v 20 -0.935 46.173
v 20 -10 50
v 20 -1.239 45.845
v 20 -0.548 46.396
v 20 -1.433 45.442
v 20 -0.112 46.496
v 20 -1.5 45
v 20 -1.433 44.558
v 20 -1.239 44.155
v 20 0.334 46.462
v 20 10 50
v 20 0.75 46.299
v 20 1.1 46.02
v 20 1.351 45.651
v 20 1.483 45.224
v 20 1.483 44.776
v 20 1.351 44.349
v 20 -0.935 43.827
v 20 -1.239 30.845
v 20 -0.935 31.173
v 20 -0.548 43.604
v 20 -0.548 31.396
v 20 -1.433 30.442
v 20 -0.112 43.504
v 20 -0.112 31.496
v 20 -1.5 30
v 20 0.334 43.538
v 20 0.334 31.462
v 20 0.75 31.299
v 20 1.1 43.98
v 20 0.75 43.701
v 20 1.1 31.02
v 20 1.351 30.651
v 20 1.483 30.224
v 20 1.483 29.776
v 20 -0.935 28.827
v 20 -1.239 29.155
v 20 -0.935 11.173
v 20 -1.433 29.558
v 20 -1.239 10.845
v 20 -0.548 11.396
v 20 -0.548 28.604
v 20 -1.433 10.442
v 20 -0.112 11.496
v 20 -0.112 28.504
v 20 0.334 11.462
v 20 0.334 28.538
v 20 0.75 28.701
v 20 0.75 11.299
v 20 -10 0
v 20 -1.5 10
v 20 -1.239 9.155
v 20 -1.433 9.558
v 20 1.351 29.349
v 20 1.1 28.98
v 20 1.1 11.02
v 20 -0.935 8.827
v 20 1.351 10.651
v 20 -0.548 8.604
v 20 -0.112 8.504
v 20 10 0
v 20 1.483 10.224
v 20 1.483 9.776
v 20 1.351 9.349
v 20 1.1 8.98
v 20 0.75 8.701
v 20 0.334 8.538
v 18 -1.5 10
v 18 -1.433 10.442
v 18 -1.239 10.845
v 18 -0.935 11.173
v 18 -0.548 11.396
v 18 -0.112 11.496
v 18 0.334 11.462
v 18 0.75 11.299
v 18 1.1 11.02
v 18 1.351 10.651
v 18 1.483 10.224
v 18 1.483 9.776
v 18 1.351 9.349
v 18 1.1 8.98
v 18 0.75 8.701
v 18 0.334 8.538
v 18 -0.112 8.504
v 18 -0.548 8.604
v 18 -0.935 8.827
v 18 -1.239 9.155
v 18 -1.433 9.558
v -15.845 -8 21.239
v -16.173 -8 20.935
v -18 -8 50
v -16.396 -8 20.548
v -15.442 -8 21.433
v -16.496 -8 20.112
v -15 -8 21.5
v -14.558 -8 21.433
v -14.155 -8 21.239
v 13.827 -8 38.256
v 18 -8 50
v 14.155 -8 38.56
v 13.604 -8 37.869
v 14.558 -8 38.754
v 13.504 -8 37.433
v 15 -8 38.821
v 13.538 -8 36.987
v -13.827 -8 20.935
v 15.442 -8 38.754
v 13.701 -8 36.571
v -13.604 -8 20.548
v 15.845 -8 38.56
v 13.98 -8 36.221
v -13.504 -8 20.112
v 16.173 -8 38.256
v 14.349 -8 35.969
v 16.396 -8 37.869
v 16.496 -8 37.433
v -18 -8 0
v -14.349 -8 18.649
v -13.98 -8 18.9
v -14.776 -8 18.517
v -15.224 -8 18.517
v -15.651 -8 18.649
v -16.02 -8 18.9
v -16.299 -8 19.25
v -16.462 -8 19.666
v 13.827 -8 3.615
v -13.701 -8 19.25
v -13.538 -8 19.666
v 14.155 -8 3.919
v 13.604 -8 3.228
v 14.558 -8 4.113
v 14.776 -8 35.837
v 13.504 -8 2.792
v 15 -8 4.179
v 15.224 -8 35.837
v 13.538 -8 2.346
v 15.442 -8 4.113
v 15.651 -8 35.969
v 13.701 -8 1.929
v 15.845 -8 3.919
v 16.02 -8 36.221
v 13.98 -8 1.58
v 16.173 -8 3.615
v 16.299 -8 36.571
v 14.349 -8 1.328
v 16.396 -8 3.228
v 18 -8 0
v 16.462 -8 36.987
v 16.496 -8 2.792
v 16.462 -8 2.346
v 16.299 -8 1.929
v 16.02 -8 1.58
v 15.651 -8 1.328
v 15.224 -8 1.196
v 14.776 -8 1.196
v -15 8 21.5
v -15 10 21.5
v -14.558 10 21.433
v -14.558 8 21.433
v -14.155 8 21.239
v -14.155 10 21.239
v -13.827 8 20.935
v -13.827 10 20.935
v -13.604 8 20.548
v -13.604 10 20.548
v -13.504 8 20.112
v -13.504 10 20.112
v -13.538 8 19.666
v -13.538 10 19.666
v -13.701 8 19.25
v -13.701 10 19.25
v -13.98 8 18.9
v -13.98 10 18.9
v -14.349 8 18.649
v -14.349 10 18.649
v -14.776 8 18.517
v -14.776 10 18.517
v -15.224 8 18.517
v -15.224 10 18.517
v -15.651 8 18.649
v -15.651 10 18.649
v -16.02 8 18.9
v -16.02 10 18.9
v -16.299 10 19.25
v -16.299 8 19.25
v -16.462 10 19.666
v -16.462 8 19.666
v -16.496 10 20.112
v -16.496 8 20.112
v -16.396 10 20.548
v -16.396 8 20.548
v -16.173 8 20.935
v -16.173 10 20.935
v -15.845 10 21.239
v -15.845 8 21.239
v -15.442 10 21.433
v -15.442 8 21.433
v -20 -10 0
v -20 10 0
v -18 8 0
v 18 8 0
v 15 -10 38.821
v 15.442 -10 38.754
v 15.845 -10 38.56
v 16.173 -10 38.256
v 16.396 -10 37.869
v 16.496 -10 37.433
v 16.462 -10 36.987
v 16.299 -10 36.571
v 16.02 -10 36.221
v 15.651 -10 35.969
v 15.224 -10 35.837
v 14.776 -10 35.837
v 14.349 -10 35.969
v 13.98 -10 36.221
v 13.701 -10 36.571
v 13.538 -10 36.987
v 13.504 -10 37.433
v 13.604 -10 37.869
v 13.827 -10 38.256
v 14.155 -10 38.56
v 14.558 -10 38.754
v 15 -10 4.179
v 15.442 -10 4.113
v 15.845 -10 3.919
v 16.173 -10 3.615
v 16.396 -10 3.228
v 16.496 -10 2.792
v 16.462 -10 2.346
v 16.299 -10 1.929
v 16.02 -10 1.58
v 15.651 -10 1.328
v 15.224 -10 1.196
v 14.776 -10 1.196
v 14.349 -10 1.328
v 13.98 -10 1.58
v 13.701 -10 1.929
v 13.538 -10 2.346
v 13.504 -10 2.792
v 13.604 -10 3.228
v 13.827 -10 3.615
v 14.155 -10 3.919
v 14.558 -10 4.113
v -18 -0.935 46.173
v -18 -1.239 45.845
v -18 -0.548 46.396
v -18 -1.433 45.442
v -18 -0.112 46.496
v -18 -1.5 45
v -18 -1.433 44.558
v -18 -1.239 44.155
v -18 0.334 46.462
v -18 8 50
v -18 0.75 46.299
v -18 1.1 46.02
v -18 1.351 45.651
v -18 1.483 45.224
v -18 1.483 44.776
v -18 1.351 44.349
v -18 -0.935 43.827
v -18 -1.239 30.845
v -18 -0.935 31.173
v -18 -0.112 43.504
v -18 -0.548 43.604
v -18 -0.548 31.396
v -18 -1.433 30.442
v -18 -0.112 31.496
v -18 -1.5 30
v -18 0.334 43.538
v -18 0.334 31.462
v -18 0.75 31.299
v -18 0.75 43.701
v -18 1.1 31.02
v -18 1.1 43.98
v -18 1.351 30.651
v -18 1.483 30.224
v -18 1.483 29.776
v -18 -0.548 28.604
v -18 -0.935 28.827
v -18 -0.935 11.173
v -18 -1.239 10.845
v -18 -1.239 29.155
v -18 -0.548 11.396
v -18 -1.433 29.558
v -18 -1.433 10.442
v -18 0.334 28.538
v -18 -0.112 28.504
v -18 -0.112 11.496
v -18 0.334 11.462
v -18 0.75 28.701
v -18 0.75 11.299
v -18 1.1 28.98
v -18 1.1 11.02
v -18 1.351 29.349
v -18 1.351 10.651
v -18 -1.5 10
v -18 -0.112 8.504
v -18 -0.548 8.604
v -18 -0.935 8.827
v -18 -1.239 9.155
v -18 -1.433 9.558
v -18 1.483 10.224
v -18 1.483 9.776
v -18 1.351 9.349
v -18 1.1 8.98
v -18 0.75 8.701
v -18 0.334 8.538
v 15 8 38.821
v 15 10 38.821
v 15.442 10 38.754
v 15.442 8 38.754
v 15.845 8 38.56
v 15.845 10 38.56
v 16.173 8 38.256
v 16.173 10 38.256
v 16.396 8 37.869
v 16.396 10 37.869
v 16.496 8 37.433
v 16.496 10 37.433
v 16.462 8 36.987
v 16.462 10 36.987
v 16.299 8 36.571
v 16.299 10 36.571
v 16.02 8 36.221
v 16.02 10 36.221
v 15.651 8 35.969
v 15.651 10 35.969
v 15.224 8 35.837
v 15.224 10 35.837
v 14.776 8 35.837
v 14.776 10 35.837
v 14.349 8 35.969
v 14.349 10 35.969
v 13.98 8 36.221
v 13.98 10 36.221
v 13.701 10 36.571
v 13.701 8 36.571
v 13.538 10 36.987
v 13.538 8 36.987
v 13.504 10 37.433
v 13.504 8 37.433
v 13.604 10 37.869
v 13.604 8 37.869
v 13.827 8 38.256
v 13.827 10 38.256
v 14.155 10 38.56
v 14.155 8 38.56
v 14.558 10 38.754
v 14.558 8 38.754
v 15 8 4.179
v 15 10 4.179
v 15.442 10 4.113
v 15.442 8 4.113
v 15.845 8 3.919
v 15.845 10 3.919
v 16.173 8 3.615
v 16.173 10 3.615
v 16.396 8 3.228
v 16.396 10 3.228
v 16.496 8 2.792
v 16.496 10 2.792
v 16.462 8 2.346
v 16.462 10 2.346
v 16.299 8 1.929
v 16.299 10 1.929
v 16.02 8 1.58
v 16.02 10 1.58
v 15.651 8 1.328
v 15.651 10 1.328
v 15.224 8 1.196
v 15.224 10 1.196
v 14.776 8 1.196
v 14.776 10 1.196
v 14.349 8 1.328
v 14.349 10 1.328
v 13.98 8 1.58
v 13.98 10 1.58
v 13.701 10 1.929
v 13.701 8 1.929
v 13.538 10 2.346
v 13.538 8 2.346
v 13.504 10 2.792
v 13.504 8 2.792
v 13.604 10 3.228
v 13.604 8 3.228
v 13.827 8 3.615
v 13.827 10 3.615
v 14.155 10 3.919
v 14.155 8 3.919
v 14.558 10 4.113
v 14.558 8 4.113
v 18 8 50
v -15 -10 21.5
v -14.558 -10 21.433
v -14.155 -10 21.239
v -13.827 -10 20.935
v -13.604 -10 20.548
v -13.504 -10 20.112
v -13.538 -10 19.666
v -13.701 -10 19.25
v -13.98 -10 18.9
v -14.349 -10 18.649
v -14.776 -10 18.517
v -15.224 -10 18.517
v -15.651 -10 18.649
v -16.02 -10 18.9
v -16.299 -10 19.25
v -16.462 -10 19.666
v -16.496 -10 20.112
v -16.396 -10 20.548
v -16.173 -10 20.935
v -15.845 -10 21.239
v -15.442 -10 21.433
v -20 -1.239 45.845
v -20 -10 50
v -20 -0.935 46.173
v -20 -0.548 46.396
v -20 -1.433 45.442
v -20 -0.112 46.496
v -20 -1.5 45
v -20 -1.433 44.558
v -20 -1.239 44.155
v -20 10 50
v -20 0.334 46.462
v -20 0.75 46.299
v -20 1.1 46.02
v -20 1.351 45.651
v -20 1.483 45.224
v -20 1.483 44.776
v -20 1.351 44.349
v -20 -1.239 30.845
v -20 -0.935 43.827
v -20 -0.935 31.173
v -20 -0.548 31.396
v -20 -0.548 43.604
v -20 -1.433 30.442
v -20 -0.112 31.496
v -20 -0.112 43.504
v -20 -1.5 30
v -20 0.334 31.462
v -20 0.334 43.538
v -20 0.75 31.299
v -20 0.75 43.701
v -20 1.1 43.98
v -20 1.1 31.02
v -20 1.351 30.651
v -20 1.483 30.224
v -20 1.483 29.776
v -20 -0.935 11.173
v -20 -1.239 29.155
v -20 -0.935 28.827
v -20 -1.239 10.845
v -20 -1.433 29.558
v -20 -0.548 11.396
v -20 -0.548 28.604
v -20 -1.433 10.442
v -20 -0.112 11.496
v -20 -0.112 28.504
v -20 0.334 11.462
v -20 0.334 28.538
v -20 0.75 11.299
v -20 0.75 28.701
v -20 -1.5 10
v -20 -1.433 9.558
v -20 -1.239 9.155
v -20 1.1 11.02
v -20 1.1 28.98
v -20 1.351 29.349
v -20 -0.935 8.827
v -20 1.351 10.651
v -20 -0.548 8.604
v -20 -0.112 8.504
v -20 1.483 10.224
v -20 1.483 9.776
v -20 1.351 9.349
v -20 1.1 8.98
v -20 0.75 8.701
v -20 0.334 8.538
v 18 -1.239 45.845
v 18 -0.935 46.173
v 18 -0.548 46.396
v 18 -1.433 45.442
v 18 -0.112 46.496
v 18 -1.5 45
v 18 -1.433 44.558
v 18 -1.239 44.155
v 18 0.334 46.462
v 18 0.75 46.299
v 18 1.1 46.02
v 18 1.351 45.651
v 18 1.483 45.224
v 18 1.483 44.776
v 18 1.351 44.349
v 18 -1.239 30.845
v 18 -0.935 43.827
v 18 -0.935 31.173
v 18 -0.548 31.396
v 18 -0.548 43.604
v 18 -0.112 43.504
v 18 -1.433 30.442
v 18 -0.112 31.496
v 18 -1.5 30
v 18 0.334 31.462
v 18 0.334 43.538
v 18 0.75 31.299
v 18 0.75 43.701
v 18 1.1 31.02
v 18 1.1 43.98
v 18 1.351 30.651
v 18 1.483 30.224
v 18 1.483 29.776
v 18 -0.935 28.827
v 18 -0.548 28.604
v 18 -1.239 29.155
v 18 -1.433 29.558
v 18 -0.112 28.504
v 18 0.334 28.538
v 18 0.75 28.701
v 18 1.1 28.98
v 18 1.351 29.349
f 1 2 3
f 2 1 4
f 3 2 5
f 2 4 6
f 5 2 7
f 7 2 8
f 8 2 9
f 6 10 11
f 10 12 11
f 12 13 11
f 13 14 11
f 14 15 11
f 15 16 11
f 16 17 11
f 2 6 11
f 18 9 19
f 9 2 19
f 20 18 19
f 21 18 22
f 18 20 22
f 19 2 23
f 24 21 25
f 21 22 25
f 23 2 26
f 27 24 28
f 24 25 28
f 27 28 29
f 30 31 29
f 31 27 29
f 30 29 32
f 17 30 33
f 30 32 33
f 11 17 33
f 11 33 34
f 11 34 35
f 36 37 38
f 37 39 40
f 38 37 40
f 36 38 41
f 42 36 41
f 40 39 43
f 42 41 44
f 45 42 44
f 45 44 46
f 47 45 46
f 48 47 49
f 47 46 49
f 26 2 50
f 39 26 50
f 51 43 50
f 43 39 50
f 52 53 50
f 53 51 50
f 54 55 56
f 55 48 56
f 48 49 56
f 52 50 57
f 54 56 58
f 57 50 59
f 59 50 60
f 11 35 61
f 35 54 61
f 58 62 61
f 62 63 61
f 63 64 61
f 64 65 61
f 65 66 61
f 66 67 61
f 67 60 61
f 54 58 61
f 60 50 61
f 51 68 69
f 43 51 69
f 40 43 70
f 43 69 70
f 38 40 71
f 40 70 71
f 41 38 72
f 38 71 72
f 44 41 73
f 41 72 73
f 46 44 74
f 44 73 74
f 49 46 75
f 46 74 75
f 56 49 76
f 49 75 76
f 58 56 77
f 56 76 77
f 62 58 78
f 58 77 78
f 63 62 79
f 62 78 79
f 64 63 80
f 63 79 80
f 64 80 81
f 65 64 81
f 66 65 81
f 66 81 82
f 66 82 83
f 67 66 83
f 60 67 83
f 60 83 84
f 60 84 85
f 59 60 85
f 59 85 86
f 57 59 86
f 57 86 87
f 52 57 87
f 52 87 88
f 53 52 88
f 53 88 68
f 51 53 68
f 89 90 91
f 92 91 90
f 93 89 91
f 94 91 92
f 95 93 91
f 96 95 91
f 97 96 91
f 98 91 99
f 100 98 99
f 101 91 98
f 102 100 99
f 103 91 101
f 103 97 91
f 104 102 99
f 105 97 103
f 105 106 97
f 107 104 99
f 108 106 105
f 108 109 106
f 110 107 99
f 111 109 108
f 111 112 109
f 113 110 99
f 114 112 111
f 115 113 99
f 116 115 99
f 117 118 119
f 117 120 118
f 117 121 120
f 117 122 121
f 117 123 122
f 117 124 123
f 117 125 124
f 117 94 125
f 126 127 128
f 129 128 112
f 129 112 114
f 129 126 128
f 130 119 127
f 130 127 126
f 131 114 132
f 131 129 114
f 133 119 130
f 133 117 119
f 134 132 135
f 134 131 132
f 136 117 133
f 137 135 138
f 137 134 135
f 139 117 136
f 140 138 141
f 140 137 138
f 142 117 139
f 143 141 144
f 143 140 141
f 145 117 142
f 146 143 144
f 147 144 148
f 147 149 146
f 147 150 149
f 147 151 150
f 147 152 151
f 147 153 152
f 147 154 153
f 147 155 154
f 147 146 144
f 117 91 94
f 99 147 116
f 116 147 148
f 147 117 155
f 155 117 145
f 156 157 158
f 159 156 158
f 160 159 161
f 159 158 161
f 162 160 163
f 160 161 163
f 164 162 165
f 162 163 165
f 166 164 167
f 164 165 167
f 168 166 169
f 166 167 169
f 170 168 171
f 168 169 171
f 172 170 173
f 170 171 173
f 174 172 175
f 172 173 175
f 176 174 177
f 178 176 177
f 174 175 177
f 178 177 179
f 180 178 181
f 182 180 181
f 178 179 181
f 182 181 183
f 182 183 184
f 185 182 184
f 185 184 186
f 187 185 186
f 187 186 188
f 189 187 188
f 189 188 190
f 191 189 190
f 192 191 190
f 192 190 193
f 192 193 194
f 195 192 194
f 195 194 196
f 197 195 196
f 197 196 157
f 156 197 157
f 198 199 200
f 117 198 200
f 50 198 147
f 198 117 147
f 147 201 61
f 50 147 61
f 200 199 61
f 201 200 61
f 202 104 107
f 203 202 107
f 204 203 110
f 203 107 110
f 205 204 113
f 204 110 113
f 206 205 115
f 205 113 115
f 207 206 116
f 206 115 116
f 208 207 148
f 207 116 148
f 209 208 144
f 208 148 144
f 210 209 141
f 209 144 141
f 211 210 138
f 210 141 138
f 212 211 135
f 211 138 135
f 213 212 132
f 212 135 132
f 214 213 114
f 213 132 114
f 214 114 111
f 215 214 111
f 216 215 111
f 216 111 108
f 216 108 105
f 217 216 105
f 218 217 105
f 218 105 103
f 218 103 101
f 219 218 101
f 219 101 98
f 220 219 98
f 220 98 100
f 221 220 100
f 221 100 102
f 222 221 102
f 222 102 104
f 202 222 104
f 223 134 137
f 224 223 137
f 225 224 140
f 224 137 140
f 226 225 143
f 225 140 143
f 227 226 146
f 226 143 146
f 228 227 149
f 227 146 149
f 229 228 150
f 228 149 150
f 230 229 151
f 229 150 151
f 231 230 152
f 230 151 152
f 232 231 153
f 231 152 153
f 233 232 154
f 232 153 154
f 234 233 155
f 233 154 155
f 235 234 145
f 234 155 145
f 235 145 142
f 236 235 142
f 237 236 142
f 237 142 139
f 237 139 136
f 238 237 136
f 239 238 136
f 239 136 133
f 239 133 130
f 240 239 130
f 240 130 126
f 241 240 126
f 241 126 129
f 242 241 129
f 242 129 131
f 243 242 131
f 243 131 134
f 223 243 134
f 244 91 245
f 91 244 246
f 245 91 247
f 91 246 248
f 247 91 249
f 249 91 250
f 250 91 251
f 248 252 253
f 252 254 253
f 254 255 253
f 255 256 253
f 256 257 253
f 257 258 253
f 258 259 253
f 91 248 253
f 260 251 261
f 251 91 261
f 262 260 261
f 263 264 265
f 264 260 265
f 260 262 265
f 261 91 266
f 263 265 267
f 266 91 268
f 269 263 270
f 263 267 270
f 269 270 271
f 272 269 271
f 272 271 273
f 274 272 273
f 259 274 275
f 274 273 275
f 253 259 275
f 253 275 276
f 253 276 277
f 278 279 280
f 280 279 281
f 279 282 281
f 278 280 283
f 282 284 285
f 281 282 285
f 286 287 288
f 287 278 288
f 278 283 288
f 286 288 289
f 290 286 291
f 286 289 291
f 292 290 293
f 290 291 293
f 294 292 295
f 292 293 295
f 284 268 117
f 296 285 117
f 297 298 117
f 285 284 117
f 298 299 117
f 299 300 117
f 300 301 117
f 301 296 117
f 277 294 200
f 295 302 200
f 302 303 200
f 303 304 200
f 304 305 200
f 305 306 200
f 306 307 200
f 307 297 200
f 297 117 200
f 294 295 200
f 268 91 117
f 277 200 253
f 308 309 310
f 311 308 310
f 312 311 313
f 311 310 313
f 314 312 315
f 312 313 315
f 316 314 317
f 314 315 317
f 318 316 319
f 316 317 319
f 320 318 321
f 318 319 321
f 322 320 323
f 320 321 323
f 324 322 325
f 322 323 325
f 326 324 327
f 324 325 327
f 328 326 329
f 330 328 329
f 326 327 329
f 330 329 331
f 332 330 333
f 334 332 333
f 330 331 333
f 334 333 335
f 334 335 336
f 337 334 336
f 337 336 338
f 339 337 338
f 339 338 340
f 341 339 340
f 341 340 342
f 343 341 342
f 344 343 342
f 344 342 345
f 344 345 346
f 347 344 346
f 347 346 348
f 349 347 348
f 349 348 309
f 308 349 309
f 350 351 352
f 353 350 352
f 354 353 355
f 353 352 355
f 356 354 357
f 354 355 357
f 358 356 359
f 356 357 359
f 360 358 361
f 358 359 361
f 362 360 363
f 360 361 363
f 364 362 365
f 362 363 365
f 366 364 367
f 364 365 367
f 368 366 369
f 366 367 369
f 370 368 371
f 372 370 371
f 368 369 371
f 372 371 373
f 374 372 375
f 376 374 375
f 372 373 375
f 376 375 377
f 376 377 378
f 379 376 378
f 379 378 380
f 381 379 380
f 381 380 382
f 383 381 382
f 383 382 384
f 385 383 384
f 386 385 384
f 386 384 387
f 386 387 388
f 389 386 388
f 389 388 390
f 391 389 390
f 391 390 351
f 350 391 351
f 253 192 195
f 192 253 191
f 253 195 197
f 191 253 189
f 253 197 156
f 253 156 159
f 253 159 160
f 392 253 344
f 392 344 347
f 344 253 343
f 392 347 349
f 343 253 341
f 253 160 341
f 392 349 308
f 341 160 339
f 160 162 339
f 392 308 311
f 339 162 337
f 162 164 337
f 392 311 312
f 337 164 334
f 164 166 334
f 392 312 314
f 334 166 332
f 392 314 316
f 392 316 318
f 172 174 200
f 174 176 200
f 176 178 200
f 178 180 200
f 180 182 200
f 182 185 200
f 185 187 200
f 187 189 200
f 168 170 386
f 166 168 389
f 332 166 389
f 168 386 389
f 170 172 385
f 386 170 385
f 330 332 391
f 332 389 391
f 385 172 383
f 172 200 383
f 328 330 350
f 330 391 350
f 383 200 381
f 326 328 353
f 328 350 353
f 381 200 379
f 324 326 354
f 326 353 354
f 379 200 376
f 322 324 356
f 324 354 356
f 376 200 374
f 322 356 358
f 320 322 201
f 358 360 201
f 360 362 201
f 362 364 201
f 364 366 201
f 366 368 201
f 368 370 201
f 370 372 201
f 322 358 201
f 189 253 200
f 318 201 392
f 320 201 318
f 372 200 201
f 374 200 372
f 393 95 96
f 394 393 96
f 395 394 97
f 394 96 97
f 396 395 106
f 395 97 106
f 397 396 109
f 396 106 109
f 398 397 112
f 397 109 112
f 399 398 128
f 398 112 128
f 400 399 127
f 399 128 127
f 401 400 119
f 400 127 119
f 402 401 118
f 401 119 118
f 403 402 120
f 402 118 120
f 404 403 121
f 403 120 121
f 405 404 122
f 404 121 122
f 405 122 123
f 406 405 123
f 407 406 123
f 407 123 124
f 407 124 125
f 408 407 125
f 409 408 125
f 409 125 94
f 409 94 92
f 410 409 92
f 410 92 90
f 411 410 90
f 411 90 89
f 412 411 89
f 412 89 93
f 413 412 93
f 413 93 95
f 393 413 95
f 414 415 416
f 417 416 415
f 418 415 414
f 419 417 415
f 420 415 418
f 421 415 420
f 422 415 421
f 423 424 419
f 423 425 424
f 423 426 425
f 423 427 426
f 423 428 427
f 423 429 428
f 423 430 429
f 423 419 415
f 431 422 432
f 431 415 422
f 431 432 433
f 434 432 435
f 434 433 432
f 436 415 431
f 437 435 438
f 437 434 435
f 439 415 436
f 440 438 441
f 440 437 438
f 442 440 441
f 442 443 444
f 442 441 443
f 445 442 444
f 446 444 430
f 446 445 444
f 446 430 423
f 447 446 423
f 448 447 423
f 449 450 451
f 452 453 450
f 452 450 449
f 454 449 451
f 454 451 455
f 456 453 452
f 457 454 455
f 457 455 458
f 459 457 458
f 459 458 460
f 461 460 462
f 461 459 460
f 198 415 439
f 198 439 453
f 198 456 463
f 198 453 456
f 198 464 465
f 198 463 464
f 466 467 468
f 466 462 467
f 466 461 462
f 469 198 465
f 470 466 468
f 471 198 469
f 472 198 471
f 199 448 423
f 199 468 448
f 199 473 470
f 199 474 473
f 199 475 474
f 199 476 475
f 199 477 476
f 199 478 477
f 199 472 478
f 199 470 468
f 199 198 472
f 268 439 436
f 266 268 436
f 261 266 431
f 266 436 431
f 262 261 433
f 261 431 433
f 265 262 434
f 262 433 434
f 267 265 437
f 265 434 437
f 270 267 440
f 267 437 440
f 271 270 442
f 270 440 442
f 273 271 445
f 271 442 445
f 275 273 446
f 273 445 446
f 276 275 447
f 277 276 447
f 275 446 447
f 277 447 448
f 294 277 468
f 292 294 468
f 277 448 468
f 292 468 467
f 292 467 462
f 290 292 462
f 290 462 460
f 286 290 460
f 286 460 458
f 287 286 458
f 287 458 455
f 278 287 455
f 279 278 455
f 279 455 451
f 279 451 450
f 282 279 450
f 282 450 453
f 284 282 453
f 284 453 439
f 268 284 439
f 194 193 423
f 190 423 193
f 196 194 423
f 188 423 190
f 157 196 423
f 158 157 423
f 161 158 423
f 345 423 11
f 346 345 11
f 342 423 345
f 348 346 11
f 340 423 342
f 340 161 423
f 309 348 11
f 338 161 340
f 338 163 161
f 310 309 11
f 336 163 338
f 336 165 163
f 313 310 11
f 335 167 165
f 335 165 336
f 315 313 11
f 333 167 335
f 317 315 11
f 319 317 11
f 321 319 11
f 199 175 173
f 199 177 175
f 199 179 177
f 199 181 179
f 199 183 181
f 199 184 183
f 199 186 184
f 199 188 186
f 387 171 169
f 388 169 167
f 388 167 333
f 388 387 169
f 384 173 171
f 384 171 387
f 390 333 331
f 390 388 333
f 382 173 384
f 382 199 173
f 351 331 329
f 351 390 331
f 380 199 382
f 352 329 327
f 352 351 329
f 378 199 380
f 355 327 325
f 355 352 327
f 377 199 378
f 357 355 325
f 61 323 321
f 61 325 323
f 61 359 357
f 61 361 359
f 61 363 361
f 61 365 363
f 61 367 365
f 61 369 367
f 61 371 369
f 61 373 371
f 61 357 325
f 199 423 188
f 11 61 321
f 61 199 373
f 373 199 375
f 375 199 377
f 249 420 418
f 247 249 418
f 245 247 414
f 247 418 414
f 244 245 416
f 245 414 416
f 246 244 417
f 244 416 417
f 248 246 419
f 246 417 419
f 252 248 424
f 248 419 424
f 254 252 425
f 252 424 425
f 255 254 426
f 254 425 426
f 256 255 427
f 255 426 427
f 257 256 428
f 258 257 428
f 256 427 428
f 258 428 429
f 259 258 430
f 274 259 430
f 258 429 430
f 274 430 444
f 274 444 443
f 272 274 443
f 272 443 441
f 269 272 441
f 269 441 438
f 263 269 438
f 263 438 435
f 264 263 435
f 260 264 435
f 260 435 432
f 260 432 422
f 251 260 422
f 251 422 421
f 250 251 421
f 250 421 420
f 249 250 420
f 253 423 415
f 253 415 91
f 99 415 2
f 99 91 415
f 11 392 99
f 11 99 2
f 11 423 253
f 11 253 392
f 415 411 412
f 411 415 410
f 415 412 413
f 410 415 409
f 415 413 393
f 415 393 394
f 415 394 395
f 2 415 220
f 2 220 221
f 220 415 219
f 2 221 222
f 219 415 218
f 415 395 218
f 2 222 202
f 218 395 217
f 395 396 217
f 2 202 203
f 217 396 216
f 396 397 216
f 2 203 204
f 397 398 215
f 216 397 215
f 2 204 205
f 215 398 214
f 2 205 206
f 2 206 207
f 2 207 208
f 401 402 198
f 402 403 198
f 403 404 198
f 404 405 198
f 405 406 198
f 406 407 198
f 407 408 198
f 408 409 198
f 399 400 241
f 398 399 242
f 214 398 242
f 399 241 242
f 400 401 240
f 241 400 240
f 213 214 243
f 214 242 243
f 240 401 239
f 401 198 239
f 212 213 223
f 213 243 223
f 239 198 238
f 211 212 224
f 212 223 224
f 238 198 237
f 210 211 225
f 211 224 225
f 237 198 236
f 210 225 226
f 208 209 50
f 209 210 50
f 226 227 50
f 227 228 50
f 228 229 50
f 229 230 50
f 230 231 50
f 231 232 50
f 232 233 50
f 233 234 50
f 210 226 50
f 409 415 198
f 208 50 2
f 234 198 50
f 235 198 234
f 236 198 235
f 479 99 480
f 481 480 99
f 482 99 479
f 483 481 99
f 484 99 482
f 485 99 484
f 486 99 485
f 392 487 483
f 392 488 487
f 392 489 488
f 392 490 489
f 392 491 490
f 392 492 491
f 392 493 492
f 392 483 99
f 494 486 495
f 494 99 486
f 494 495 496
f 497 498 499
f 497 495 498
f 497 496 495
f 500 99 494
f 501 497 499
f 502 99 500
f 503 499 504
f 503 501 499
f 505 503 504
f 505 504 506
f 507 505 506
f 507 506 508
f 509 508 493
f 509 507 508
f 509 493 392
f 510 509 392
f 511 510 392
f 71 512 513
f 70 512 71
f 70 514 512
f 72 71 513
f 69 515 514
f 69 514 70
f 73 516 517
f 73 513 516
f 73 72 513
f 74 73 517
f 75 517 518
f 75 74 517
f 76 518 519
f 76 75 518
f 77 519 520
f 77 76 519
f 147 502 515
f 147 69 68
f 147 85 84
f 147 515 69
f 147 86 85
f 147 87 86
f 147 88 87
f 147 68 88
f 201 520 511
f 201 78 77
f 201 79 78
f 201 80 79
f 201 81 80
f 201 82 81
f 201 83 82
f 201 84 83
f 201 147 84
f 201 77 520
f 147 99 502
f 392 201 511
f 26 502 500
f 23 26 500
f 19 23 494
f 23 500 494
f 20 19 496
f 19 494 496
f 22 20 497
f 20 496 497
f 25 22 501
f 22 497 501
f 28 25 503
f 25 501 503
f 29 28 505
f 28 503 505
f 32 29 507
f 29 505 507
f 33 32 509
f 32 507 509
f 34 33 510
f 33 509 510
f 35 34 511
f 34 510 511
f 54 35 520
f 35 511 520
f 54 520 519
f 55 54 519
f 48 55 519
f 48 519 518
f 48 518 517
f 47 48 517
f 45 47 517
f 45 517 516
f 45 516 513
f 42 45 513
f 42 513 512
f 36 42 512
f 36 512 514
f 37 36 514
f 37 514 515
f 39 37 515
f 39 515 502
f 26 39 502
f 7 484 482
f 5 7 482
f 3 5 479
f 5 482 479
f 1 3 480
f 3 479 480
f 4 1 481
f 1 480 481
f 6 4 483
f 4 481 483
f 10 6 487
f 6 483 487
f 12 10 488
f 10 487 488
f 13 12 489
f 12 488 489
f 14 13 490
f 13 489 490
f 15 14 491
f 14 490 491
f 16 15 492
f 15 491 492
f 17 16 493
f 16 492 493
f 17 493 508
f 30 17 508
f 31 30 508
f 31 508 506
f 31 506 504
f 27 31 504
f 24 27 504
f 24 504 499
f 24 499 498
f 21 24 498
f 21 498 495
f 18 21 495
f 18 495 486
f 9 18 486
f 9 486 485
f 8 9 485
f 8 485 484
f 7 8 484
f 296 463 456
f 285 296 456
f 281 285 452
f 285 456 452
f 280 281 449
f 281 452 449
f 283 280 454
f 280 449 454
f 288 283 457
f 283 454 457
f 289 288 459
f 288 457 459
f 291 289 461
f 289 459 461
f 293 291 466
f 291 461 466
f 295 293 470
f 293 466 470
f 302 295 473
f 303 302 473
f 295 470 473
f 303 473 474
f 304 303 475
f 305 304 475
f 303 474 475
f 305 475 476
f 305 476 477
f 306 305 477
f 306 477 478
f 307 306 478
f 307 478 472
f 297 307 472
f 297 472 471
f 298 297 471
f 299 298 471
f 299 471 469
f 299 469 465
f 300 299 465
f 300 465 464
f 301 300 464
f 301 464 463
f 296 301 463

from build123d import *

# Parameters (mm, degrees)
SKETCH_1_W          = 40
SKETCH_1_H          = 20
SKETCH_1_W_2        = 36
SKETCH_1_H_2        = 16
EXTRUDE_1_DEPTH     = 50
SKETCH_2_R          = 1.5
CUT_EXTRUDE_1_DEPTH = 50
SKETCH_3_R          = 1.5
CUT_EXTRUDE_2_DEPTH = 50


with BuildPart() as part:
    # 草图1 → 凸台-拉伸1 (new body)
    with BuildSketch(Plane.XY):
        Rectangle(SKETCH_1_W, SKETCH_1_H)
        Rectangle(SKETCH_1_W_2, SKETCH_1_H_2, mode=Mode.SUBTRACT)
    extrude(amount=EXTRUDE_1_DEPTH)

    # 草图2 → 切除-拉伸1 (cut)
    with BuildSketch(Plane(origin=(0, 10, 0), x_dir=(1, 0, 0), z_dir=(0, 1, 0))):
        with Locations(Location((-15, -20, 0), (0, 0, 270))):
            Circle(SKETCH_2_R)
        with Locations(Location((15, -2.679491924, 0), (0, 0, 270))):
            Circle(SKETCH_2_R)
        with Locations(Location((15, -37.320508076, 0), (0, 0, 270))):
            Circle(SKETCH_2_R)
    extrude(amount=-CUT_EXTRUDE_1_DEPTH, mode=Mode.SUBTRACT)

    # 草图3 → 切除-拉伸2 (cut)
    with BuildSketch(Plane.ZY.offset(20)):
        with Locations(Location((10, 0, 0), (0, 0, 270))):
            Circle(SKETCH_3_R)
        with Locations(Location((30, 0, 0), (0, 0, 270))):
            Circle(SKETCH_3_R)
        with Locations(Location((45, 0, 0), (0, 0, 270))):
            Circle(SKETCH_3_R)
    extrude(amount=-CUT_EXTRUDE_2_DEPTH, mode=Mode.SUBTRACT)


solid = part.part
